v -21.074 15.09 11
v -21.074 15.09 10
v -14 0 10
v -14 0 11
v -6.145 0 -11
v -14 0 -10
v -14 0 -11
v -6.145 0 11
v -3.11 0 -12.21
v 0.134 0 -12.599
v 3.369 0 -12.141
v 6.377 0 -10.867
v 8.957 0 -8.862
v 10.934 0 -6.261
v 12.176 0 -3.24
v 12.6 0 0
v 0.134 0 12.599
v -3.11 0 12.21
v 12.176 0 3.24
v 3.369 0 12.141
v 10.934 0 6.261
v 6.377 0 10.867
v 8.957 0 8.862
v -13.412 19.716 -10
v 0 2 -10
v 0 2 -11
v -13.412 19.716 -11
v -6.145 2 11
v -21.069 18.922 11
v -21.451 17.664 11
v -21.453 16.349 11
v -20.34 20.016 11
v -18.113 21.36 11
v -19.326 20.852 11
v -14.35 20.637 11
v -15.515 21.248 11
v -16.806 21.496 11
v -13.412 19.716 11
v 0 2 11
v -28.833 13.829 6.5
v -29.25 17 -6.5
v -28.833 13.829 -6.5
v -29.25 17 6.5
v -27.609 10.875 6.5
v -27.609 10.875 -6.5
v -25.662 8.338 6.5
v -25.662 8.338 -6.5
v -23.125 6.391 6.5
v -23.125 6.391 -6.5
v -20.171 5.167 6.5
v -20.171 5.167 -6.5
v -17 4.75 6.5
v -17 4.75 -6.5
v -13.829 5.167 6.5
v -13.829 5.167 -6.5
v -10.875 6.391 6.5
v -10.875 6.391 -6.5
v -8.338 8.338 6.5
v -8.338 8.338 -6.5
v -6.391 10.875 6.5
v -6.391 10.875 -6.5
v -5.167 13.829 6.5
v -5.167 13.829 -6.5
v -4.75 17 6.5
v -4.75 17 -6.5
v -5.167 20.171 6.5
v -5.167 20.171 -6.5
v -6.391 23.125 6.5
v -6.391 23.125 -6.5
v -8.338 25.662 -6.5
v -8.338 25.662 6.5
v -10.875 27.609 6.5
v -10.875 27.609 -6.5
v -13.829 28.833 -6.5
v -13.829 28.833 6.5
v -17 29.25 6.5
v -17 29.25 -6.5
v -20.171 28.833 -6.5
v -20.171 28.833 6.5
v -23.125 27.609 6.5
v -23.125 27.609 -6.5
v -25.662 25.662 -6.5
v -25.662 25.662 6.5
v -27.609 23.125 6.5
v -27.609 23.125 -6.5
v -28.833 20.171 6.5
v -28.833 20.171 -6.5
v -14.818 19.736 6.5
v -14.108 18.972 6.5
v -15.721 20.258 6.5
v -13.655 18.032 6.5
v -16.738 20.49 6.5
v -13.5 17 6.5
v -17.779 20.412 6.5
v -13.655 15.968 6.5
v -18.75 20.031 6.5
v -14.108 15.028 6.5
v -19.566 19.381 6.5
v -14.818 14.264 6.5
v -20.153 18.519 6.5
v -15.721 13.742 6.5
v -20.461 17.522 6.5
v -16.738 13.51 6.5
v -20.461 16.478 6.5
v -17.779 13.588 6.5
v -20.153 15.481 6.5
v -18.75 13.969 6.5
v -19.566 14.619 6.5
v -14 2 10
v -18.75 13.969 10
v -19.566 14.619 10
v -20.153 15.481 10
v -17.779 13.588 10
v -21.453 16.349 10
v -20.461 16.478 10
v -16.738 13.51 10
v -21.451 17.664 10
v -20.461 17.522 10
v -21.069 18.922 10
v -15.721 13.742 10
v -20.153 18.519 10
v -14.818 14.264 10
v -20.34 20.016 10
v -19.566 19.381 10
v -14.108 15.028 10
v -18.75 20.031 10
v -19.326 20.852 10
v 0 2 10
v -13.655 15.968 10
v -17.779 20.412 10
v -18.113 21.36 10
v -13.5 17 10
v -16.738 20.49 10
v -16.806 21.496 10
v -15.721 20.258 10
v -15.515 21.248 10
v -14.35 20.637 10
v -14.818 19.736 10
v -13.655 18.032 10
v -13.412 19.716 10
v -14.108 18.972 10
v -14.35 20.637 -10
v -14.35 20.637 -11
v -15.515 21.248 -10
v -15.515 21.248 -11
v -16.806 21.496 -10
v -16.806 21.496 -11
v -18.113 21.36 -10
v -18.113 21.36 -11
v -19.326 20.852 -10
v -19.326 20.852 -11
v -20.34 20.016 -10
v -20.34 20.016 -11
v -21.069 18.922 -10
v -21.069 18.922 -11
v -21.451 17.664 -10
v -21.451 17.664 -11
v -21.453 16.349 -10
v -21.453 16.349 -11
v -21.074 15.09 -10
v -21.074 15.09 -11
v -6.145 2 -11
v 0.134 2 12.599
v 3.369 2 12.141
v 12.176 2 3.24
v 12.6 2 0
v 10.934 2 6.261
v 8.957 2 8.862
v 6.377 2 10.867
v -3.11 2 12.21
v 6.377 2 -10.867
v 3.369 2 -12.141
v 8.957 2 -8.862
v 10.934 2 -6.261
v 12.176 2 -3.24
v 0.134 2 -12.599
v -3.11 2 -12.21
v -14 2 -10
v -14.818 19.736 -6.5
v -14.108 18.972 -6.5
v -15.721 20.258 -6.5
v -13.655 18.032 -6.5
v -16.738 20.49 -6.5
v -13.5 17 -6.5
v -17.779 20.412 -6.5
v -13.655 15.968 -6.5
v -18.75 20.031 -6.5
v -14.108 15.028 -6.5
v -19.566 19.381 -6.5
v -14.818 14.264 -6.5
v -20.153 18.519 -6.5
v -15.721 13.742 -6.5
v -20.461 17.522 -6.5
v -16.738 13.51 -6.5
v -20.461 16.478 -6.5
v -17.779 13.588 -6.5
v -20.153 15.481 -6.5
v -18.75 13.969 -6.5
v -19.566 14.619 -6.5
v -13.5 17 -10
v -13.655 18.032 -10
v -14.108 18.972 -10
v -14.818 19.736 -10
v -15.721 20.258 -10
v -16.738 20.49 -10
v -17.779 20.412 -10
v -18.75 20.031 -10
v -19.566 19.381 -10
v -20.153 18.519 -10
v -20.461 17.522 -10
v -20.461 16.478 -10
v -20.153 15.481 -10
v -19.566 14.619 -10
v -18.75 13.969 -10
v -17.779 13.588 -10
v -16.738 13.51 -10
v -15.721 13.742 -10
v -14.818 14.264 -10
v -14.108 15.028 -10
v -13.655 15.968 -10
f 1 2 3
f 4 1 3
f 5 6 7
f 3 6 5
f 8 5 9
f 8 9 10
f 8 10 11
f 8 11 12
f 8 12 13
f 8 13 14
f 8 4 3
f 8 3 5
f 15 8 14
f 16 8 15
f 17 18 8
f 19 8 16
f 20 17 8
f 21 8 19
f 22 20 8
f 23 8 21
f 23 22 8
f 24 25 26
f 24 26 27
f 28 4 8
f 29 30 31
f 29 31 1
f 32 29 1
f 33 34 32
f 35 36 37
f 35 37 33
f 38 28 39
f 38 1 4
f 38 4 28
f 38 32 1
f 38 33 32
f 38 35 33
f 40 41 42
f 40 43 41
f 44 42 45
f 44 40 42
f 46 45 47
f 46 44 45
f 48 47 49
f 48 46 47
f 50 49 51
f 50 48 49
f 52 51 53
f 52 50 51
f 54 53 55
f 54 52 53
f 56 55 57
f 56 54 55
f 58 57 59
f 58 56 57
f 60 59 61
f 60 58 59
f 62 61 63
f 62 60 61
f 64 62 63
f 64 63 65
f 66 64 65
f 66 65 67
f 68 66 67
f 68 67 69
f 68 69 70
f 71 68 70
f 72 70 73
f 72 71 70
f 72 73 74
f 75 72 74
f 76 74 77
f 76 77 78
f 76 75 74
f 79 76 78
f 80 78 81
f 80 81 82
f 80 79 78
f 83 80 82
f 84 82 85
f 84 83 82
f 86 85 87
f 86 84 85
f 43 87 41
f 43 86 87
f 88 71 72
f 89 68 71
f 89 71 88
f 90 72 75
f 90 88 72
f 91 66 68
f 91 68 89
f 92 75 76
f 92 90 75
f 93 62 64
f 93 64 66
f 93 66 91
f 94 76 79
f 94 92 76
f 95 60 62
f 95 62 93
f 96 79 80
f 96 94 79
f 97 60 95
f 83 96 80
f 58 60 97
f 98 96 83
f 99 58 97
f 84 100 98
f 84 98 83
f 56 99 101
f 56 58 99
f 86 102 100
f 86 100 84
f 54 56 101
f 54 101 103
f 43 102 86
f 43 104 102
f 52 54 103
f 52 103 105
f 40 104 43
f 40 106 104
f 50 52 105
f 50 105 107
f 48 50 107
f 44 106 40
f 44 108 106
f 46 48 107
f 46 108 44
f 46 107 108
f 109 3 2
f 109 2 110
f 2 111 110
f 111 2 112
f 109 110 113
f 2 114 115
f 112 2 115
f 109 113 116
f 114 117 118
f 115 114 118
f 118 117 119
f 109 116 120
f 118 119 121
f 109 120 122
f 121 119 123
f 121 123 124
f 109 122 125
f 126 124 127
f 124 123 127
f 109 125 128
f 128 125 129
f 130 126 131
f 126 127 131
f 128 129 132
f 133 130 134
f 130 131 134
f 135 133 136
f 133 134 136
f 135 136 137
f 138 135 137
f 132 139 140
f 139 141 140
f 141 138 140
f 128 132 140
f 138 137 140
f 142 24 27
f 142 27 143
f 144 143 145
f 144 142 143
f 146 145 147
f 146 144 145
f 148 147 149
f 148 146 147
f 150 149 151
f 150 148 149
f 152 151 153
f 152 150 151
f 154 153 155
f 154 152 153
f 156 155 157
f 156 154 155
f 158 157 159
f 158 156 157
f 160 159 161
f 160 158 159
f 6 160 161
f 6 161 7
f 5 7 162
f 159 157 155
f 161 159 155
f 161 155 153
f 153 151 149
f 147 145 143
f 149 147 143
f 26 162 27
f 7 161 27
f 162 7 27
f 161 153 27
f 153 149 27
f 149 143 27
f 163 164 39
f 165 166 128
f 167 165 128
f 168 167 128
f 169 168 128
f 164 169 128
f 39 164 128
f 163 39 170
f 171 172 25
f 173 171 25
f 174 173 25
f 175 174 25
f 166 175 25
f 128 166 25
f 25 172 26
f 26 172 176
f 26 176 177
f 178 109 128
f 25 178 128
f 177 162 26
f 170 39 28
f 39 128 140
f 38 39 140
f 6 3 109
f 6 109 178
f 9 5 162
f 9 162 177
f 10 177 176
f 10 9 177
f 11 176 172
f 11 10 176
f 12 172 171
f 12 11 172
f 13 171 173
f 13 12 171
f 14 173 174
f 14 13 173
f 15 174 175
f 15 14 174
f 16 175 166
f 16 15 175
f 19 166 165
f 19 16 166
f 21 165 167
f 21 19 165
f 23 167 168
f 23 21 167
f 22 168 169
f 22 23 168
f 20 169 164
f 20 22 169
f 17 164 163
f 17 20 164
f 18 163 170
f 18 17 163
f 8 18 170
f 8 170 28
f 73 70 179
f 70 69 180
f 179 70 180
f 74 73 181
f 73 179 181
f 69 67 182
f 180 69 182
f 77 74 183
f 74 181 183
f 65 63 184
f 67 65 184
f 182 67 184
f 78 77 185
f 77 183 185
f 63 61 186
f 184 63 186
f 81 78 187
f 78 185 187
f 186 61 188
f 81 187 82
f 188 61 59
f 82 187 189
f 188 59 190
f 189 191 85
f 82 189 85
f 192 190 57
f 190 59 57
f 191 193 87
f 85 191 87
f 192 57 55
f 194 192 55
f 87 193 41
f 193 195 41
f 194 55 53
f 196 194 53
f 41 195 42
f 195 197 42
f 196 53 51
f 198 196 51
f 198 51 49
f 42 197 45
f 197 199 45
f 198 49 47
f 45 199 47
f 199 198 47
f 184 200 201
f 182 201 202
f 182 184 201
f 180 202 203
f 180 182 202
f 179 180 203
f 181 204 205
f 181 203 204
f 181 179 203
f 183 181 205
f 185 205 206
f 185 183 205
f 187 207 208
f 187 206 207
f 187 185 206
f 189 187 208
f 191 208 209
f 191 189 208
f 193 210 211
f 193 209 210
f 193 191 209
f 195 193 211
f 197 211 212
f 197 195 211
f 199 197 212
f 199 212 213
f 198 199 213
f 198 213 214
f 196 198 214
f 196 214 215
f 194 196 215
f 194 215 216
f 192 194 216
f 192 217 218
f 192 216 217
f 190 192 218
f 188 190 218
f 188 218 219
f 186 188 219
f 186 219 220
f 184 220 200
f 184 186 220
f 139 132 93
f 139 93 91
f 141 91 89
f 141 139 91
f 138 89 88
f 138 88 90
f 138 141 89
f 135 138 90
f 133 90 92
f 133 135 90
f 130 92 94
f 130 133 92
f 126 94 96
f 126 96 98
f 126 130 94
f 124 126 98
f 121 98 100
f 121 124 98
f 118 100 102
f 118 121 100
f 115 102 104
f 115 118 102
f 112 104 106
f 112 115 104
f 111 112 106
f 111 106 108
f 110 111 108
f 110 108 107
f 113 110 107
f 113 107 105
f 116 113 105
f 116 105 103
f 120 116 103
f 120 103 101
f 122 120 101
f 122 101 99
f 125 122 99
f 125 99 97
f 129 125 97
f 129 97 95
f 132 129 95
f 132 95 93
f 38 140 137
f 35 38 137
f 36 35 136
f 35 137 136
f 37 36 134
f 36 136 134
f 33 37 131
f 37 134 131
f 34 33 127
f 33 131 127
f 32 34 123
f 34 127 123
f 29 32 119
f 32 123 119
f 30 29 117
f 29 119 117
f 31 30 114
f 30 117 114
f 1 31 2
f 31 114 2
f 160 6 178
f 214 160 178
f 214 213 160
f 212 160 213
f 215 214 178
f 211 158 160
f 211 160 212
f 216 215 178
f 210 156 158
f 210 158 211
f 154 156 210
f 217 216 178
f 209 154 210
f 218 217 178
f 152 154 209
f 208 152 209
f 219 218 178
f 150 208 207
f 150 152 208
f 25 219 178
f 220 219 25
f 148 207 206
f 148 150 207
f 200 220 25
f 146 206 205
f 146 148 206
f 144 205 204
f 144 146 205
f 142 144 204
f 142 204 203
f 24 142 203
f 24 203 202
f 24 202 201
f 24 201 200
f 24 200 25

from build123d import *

# Parameters (mm, degrees)
BOSS_EXTRUDE1_DEPTH = 2
BOSS_EXTRUDE2_DEPTH = 1
SKETCH3_R           = 3.5
BOSS_EXTRUDE4_DEPTH = 11
SKETCH4_R           = 12.25
BOSS_EXTRUDE5_DEPTH = 6.5


with BuildPart() as part:
    # Sketch1 → Boss-Extrude1 (new body)
    with BuildSketch(Plane(origin=(0, 0, 0), x_dir=(1, 0, 0), z_dir=(0, 1, 0))):
        with BuildLine():
            Line((-14, 10), (-7.665507159, 10))
            ThreePointArc((-7.665507159, 10), (12.6, 0), (-7.665507159, -10))
            Line((-7.665507159, -10), (-14, -10))
            Line((-14, -10), (-14, 10))
        make_face()
    extrude(amount=BOSS_EXTRUDE1_DEPTH)

    # Sketch2 → Boss-Extrude2 (add)
    with BuildSketch(Plane.XY.offset(10)):
        with BuildLine():
            Line((0, 2), (-13.412192981, 19.716181289))
            ThreePointArc((-13.412192981, 19.716181289), (-19.325951381, 20.85226559), (-21.074450498, 15.089802853))
            Line((-21.074450498, 15.089802853), (-14, 0))
            Line((-14, 0), (0, 0))
            Line((0, 0), (0, 2))
        make_face()
    boss_extrude2 = extrude(amount=BOSS_EXTRUDE2_DEPTH)

    # Sketch3 → Boss-Extrude4 (add)
    with BuildSketch(Plane.XY.offset(11)):
        with Locations((-17, 17)):
            Circle(SKETCH3_R)
    boss_extrude4 = extrude(amount=-BOSS_EXTRUDE4_DEPTH)

    # Mirror1: Boss-Extrude2, Boss-Extrude4 across plane
    add(boss_extrude2.mirror(Plane.XY))
    add(boss_extrude4.mirror(Plane.XY))

    # Sketch4 → Boss-Extrude5 (add, symmetric)
    with BuildSketch(Plane.XY):
        with Locations(Location((-17, 17, 0), (0, 0, 180))):
            Circle(SKETCH4_R)
    extrude(amount=BOSS_EXTRUDE5_DEPTH, both=True)


solid = part.part
